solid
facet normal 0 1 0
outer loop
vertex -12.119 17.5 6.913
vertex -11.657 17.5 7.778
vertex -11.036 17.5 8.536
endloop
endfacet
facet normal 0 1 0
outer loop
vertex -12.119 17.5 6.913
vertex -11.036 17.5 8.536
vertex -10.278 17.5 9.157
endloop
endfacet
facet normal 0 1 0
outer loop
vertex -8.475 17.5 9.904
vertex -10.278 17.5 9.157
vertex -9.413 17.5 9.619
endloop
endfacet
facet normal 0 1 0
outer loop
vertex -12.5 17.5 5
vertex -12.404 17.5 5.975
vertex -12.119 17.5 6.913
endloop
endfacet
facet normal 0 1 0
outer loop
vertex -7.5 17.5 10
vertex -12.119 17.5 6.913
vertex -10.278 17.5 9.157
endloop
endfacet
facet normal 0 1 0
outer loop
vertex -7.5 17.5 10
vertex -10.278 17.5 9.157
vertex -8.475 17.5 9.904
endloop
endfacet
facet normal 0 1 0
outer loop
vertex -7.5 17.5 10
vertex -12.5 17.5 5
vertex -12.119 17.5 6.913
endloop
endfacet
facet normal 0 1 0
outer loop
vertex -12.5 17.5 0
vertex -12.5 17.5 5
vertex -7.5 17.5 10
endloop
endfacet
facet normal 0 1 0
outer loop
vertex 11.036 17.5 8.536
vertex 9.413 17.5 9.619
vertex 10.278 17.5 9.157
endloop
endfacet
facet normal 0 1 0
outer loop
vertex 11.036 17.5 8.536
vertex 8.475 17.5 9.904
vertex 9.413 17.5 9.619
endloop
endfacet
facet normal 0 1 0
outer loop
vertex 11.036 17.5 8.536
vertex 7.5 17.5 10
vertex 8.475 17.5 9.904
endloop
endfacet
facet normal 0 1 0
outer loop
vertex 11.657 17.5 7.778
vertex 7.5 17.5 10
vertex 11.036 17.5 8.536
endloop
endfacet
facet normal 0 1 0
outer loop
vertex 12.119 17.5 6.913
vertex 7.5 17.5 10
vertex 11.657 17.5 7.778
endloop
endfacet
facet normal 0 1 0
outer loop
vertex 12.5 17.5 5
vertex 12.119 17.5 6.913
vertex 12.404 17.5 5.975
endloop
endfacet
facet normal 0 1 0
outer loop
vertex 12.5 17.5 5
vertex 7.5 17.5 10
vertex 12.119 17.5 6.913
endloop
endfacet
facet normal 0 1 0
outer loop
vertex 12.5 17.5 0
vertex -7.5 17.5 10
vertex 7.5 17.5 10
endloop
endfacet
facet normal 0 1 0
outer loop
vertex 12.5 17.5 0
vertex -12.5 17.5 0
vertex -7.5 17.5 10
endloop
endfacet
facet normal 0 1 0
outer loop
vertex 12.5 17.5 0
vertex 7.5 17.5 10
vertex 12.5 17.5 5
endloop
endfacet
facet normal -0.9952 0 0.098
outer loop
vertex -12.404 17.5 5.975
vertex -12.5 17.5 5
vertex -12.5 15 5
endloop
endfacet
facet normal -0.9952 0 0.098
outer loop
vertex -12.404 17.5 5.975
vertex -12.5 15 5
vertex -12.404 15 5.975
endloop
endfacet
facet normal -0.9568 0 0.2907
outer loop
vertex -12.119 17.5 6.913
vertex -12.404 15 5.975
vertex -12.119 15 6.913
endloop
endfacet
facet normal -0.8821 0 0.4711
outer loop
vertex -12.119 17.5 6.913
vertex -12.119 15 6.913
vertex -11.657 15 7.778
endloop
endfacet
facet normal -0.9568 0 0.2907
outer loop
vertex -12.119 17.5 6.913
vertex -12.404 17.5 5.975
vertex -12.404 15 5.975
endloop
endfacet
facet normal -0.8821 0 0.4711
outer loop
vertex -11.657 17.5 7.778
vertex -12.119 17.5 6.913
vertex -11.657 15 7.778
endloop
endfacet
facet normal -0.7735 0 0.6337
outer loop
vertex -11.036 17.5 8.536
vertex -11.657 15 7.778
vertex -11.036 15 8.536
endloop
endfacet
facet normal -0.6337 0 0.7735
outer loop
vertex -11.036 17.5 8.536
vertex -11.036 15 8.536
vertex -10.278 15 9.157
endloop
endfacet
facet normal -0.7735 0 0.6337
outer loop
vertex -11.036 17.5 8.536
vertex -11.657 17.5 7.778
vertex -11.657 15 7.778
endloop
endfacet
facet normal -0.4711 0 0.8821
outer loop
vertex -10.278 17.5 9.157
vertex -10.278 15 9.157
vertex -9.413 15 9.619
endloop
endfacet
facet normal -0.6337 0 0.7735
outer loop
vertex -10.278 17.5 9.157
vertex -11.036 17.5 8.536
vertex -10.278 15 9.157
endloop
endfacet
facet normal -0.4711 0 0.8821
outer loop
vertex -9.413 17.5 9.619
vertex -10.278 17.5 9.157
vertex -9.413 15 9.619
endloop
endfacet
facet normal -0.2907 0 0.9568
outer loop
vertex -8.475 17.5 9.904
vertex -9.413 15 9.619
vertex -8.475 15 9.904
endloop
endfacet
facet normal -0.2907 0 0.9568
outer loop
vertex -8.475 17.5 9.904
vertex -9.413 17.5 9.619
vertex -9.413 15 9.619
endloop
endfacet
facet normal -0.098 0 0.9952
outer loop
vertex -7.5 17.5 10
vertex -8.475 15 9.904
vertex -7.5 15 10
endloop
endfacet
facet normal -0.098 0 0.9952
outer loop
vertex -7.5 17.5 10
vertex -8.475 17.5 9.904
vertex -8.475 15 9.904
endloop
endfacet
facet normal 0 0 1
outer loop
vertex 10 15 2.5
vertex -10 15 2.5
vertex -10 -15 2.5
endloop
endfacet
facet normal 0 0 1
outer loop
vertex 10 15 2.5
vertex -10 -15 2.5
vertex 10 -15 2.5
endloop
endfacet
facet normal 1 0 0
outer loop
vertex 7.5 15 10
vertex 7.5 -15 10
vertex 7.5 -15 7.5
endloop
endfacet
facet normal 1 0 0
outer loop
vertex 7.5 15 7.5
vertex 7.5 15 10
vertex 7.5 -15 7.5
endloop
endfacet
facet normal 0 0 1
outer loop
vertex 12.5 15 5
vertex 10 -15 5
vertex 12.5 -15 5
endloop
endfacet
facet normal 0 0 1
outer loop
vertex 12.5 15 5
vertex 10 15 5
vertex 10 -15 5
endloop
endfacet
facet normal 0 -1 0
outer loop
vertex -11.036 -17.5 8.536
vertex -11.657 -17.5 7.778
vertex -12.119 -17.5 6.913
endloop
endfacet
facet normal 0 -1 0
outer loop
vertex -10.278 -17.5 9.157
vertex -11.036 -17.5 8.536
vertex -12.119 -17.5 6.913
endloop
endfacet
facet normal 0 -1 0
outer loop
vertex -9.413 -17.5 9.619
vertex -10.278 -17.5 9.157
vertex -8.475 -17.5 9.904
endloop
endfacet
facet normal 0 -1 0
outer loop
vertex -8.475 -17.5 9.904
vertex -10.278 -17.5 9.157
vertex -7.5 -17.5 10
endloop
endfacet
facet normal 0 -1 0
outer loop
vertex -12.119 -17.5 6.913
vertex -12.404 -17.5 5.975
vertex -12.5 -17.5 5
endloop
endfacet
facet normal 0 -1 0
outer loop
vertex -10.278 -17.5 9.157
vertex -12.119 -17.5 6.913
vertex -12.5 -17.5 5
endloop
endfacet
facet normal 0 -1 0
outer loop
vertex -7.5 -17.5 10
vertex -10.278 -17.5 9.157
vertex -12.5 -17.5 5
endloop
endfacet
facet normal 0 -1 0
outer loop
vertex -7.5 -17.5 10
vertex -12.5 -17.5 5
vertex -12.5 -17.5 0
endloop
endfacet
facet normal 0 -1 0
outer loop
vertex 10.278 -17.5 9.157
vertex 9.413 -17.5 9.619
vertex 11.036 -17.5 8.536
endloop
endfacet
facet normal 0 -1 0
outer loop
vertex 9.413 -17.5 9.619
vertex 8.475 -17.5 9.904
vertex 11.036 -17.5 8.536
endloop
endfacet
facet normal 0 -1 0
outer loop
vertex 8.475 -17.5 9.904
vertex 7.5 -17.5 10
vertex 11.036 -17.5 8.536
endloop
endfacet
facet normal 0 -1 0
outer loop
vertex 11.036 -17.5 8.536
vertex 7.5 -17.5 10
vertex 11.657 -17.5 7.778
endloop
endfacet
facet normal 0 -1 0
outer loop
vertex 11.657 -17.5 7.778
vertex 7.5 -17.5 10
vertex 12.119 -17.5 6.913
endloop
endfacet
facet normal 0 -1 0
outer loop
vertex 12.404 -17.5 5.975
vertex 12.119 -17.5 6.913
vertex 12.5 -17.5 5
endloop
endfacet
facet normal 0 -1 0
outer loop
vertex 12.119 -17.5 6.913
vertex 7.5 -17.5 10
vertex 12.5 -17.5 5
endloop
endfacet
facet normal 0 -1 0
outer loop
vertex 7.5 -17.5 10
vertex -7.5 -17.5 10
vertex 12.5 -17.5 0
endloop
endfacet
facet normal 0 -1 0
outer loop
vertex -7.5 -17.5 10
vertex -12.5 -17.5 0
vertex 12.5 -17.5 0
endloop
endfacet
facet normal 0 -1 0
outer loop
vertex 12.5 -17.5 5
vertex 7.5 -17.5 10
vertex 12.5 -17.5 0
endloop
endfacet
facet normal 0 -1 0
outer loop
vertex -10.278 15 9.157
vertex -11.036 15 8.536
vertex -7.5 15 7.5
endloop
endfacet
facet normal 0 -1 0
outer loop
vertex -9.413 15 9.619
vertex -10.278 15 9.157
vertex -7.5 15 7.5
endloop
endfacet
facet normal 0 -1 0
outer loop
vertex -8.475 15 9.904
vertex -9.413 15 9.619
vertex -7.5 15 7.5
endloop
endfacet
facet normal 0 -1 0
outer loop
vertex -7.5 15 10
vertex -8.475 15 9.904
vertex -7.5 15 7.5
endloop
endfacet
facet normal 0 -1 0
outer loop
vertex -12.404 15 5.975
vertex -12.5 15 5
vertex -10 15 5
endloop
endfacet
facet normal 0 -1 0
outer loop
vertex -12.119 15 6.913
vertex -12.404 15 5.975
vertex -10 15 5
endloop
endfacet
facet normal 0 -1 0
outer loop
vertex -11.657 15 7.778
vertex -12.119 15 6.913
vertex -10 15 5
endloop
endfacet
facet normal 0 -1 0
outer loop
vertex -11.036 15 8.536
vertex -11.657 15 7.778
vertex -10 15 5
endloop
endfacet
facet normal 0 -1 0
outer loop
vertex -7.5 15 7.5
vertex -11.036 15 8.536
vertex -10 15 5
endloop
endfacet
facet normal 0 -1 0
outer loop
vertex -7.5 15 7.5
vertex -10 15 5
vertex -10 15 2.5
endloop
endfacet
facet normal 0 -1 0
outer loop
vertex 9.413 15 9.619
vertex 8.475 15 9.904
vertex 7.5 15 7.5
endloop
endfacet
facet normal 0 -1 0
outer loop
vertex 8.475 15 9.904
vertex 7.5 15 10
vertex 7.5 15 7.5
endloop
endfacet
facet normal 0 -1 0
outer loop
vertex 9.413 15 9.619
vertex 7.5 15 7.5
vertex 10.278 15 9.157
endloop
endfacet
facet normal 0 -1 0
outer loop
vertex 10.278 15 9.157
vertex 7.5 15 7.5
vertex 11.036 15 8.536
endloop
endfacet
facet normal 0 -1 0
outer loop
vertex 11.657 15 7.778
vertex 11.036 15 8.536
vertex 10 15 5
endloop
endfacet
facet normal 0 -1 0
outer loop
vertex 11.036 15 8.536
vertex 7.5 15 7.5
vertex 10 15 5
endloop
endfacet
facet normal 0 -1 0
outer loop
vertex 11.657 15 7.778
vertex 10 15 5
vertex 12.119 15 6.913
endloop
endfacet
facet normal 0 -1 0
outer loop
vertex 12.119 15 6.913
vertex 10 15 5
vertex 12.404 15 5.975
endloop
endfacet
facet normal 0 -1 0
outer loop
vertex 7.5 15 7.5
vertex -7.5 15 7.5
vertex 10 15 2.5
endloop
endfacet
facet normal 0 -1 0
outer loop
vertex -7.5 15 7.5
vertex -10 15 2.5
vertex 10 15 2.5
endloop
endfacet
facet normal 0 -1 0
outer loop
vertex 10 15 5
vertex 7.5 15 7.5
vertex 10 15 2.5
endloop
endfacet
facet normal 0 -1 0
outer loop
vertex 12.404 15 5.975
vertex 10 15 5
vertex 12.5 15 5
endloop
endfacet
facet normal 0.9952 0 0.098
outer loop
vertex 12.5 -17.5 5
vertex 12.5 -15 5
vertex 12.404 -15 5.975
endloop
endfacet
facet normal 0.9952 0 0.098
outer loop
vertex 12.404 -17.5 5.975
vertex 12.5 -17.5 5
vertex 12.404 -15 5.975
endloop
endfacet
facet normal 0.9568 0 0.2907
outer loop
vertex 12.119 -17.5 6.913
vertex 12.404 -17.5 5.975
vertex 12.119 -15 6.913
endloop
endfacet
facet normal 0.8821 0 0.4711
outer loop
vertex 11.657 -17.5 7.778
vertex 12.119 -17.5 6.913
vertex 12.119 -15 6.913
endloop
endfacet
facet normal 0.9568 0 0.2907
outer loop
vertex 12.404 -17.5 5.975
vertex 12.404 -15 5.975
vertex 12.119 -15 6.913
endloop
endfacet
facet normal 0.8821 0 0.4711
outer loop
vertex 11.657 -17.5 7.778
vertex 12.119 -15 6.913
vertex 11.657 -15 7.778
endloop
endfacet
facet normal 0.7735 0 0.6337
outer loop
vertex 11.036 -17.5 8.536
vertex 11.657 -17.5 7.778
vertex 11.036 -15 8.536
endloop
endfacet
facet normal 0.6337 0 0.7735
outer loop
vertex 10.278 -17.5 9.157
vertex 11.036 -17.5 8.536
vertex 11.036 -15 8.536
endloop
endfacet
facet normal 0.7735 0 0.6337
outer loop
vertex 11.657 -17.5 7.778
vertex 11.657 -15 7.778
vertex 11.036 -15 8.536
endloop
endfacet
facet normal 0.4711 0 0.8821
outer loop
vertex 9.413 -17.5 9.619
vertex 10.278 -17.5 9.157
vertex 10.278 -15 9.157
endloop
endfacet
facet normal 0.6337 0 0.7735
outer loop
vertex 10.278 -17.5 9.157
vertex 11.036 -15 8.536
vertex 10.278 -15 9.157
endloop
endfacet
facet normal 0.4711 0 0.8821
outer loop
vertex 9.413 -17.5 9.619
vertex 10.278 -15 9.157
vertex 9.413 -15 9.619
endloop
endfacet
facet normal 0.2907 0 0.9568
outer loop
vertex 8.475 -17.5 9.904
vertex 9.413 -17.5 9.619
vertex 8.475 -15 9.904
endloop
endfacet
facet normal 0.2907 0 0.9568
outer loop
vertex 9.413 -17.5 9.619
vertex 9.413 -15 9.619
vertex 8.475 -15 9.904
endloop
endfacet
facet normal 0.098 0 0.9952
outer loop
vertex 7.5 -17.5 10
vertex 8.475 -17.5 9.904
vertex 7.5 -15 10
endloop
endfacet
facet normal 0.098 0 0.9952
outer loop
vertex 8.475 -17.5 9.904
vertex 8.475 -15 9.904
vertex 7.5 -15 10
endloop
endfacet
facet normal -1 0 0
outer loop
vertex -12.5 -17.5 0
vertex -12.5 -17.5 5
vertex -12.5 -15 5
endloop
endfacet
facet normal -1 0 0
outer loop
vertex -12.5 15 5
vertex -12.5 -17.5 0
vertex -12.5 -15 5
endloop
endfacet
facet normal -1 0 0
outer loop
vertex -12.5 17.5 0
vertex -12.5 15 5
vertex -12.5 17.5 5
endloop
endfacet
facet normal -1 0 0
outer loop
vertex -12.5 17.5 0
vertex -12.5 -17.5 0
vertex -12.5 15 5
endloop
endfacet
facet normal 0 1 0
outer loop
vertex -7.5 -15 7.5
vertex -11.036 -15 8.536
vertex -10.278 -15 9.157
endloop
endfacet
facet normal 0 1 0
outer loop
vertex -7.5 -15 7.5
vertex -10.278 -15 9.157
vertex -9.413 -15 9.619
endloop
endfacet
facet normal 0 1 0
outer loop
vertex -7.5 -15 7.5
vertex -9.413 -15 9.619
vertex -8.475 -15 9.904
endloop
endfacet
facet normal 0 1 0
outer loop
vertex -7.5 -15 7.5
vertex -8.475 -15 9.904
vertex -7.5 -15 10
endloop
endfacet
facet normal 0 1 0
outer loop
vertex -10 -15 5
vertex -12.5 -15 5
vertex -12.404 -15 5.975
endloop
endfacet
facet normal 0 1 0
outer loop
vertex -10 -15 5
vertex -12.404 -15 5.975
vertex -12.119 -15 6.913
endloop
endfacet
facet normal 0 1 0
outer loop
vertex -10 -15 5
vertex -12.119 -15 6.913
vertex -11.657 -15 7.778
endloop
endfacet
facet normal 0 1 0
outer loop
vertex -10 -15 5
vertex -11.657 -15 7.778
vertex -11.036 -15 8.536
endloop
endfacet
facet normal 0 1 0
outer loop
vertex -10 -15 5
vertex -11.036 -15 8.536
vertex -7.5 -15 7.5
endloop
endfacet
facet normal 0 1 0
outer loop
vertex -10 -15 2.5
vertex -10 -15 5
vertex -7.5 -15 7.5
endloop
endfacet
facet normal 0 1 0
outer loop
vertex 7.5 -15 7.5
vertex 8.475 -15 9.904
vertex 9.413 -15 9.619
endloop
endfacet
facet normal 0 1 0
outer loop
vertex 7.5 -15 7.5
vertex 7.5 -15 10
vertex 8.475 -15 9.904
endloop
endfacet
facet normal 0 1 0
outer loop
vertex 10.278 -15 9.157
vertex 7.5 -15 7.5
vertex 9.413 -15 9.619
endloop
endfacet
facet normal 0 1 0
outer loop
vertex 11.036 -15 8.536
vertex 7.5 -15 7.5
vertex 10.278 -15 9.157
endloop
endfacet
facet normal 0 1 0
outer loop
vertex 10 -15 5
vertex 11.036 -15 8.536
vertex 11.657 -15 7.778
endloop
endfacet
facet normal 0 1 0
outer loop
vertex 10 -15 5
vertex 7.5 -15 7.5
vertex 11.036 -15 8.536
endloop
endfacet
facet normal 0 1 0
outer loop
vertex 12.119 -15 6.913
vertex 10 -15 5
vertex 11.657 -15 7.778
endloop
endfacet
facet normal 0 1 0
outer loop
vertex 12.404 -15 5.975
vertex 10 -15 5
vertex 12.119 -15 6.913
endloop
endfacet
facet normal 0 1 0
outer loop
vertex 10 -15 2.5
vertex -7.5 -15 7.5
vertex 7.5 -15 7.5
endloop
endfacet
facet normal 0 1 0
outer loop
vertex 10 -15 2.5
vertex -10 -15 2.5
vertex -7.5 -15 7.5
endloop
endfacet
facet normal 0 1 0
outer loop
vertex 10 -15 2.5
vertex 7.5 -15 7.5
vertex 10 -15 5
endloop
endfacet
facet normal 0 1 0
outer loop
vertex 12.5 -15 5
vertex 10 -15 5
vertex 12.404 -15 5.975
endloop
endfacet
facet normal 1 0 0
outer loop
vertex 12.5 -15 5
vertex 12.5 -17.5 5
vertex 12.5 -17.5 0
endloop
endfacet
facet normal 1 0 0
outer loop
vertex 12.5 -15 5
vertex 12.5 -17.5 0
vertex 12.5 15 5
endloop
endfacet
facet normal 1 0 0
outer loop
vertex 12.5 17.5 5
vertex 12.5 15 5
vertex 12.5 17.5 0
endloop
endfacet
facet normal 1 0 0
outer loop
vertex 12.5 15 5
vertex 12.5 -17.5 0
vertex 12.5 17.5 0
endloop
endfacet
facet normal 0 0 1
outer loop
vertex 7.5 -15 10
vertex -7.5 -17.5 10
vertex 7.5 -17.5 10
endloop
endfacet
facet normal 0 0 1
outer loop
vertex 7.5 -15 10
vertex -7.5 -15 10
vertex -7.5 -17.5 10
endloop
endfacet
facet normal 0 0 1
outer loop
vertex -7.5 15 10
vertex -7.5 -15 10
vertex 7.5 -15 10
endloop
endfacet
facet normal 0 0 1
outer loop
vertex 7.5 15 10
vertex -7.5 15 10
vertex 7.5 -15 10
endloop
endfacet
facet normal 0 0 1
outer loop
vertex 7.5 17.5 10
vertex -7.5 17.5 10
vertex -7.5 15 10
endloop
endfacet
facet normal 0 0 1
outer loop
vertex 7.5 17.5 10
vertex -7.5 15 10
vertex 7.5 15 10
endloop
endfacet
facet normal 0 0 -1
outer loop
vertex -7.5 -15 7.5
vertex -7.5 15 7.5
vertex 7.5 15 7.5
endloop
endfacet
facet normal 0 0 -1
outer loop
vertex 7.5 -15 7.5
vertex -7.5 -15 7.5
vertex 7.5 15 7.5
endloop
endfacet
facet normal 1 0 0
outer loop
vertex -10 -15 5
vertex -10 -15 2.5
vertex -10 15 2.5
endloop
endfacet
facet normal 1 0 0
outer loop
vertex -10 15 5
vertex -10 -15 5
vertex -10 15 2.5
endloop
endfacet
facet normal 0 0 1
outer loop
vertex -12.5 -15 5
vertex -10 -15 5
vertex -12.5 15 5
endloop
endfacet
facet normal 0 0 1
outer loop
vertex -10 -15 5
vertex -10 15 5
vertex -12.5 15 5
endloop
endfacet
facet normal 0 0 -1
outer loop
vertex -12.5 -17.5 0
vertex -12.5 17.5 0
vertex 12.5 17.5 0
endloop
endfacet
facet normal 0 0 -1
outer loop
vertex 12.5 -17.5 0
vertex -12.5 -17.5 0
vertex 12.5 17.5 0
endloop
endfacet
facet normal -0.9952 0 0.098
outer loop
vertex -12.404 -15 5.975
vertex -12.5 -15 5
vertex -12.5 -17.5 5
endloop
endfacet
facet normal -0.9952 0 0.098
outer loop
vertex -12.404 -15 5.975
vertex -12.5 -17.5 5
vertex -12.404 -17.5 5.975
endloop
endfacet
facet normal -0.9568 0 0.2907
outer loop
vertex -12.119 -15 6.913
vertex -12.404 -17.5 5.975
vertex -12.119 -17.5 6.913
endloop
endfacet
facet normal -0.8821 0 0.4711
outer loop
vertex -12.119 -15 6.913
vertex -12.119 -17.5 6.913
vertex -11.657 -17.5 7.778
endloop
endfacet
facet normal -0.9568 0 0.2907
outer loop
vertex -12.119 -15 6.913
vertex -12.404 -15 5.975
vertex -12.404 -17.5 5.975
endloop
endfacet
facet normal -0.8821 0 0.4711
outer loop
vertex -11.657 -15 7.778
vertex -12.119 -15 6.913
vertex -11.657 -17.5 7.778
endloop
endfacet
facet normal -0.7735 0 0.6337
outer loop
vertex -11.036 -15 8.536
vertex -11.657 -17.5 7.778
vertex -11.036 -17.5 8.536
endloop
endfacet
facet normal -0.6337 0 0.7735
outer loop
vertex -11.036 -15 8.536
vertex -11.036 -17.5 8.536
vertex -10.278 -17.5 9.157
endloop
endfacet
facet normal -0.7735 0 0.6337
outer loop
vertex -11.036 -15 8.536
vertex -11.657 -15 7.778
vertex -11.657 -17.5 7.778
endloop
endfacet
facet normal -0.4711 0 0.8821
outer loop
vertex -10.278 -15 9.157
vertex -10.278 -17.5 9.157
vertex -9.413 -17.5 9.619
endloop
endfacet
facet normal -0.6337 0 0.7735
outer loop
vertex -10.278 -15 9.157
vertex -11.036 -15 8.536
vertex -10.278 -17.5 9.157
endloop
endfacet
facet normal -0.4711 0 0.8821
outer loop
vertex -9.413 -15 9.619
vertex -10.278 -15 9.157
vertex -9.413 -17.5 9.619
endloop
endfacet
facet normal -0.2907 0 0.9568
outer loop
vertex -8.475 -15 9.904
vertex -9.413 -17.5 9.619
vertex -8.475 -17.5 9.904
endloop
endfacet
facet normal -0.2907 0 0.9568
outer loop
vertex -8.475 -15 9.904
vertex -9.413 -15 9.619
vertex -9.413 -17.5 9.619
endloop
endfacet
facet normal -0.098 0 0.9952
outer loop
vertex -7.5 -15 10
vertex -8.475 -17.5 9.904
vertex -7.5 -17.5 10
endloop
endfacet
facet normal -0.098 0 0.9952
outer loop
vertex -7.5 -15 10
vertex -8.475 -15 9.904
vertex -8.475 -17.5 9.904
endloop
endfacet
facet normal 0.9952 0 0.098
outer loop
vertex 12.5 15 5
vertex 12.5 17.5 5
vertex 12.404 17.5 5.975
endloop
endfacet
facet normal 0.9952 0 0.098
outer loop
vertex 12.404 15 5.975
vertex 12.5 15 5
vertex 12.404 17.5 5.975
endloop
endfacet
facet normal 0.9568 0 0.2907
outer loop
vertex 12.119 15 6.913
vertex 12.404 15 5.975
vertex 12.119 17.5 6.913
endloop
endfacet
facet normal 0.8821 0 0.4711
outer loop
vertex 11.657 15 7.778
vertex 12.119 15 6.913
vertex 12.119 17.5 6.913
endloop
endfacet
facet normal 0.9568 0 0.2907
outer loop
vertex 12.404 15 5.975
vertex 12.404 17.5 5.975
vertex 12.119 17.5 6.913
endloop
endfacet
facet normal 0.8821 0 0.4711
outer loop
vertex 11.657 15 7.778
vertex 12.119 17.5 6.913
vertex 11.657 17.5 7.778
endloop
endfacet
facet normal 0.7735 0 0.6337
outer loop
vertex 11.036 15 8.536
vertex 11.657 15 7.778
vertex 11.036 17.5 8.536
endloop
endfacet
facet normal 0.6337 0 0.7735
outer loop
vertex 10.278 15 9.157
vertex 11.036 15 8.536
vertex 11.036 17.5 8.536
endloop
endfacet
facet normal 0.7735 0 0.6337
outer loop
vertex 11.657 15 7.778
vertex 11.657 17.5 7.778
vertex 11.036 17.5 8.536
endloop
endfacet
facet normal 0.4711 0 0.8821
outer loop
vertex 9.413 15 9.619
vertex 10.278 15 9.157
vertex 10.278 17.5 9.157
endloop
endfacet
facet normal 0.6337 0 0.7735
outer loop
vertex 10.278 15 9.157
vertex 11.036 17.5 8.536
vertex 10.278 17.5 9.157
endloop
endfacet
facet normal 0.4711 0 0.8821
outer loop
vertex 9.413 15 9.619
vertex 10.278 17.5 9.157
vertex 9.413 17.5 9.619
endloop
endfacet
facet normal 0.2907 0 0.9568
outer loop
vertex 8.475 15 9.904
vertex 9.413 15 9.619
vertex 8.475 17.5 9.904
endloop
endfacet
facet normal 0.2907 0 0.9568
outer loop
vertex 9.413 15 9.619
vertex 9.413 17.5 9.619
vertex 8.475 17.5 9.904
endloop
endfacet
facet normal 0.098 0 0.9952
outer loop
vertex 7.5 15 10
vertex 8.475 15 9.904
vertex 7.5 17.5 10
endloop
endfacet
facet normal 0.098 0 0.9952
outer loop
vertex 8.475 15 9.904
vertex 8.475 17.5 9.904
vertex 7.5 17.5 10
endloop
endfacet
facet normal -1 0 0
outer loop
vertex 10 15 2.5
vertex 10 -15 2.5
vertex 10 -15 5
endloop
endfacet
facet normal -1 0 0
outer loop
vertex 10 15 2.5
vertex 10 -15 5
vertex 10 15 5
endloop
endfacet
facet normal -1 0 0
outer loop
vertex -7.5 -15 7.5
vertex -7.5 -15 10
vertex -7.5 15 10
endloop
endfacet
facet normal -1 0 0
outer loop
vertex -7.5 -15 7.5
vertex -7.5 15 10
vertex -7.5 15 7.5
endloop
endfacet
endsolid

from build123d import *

# Parameters (mm, degrees)
F0_W     = 25
F0_H     = 35
F1_DEPTH = 5
F2_W     = 25
F2_H     = 35
F3_DEPTH = 10
F4_R     = 5
F5_T     = 2.5


# Not quite as in the source:
# - a shell that OpenCascade refuses in one call is made with other operations: the cavity is built on its own and cut out


with BuildPart() as f1:
    # F0 (on Top) → F1 (new body)
    with BuildSketch(Plane.XY):
        Rectangle(F0_W, F0_H)
    extrude(amount=F1_DEPTH)

    # F2 (on Top) → F3 (join)
    with BuildSketch(Plane.XY):
        Rectangle(F2_W, F2_H)
    extrude(amount=F3_DEPTH)

    # F4
    f4_edges = [f1.edges().sort_by_distance(p)[0] for p in [
        (-12.5, 0, 10),
        (12.5, 0, 10),
    ]]
    fillet(f4_edges, radius=F4_R)

    # F5: shell of thickness 2.5, made by hand


with BuildPart() as f5_core1:
    # F5_t2: copy of F1
    add(f1.part)

    # the walls: a layer under each face that stays
    f5_faces = [f5_core1.faces().sort_by_distance(p)[0] for p in [
        (0, -17.5, 5),
        (-12.5, 0, 2.5),
        (0, 0, 0),
        (0, 0, 10),
        (12.5, 0, 2.5),
        (0, 17.5, 5),
    ]]
    thicken(f5_faces, amount=-F5_T, mode=Mode.SUBTRACT)


with BuildPart() as f1_1:
    add(f1.part)

    # what is left inside the walls is the cavity
    f5_cavity = [f5_core1.part.solids().sort_by_distance(p)[0] for p in [
        (0, -5, 2.525),
    ]]
    add(f5_cavity, mode=Mode.SUBTRACT)


solid = f1_1.part
